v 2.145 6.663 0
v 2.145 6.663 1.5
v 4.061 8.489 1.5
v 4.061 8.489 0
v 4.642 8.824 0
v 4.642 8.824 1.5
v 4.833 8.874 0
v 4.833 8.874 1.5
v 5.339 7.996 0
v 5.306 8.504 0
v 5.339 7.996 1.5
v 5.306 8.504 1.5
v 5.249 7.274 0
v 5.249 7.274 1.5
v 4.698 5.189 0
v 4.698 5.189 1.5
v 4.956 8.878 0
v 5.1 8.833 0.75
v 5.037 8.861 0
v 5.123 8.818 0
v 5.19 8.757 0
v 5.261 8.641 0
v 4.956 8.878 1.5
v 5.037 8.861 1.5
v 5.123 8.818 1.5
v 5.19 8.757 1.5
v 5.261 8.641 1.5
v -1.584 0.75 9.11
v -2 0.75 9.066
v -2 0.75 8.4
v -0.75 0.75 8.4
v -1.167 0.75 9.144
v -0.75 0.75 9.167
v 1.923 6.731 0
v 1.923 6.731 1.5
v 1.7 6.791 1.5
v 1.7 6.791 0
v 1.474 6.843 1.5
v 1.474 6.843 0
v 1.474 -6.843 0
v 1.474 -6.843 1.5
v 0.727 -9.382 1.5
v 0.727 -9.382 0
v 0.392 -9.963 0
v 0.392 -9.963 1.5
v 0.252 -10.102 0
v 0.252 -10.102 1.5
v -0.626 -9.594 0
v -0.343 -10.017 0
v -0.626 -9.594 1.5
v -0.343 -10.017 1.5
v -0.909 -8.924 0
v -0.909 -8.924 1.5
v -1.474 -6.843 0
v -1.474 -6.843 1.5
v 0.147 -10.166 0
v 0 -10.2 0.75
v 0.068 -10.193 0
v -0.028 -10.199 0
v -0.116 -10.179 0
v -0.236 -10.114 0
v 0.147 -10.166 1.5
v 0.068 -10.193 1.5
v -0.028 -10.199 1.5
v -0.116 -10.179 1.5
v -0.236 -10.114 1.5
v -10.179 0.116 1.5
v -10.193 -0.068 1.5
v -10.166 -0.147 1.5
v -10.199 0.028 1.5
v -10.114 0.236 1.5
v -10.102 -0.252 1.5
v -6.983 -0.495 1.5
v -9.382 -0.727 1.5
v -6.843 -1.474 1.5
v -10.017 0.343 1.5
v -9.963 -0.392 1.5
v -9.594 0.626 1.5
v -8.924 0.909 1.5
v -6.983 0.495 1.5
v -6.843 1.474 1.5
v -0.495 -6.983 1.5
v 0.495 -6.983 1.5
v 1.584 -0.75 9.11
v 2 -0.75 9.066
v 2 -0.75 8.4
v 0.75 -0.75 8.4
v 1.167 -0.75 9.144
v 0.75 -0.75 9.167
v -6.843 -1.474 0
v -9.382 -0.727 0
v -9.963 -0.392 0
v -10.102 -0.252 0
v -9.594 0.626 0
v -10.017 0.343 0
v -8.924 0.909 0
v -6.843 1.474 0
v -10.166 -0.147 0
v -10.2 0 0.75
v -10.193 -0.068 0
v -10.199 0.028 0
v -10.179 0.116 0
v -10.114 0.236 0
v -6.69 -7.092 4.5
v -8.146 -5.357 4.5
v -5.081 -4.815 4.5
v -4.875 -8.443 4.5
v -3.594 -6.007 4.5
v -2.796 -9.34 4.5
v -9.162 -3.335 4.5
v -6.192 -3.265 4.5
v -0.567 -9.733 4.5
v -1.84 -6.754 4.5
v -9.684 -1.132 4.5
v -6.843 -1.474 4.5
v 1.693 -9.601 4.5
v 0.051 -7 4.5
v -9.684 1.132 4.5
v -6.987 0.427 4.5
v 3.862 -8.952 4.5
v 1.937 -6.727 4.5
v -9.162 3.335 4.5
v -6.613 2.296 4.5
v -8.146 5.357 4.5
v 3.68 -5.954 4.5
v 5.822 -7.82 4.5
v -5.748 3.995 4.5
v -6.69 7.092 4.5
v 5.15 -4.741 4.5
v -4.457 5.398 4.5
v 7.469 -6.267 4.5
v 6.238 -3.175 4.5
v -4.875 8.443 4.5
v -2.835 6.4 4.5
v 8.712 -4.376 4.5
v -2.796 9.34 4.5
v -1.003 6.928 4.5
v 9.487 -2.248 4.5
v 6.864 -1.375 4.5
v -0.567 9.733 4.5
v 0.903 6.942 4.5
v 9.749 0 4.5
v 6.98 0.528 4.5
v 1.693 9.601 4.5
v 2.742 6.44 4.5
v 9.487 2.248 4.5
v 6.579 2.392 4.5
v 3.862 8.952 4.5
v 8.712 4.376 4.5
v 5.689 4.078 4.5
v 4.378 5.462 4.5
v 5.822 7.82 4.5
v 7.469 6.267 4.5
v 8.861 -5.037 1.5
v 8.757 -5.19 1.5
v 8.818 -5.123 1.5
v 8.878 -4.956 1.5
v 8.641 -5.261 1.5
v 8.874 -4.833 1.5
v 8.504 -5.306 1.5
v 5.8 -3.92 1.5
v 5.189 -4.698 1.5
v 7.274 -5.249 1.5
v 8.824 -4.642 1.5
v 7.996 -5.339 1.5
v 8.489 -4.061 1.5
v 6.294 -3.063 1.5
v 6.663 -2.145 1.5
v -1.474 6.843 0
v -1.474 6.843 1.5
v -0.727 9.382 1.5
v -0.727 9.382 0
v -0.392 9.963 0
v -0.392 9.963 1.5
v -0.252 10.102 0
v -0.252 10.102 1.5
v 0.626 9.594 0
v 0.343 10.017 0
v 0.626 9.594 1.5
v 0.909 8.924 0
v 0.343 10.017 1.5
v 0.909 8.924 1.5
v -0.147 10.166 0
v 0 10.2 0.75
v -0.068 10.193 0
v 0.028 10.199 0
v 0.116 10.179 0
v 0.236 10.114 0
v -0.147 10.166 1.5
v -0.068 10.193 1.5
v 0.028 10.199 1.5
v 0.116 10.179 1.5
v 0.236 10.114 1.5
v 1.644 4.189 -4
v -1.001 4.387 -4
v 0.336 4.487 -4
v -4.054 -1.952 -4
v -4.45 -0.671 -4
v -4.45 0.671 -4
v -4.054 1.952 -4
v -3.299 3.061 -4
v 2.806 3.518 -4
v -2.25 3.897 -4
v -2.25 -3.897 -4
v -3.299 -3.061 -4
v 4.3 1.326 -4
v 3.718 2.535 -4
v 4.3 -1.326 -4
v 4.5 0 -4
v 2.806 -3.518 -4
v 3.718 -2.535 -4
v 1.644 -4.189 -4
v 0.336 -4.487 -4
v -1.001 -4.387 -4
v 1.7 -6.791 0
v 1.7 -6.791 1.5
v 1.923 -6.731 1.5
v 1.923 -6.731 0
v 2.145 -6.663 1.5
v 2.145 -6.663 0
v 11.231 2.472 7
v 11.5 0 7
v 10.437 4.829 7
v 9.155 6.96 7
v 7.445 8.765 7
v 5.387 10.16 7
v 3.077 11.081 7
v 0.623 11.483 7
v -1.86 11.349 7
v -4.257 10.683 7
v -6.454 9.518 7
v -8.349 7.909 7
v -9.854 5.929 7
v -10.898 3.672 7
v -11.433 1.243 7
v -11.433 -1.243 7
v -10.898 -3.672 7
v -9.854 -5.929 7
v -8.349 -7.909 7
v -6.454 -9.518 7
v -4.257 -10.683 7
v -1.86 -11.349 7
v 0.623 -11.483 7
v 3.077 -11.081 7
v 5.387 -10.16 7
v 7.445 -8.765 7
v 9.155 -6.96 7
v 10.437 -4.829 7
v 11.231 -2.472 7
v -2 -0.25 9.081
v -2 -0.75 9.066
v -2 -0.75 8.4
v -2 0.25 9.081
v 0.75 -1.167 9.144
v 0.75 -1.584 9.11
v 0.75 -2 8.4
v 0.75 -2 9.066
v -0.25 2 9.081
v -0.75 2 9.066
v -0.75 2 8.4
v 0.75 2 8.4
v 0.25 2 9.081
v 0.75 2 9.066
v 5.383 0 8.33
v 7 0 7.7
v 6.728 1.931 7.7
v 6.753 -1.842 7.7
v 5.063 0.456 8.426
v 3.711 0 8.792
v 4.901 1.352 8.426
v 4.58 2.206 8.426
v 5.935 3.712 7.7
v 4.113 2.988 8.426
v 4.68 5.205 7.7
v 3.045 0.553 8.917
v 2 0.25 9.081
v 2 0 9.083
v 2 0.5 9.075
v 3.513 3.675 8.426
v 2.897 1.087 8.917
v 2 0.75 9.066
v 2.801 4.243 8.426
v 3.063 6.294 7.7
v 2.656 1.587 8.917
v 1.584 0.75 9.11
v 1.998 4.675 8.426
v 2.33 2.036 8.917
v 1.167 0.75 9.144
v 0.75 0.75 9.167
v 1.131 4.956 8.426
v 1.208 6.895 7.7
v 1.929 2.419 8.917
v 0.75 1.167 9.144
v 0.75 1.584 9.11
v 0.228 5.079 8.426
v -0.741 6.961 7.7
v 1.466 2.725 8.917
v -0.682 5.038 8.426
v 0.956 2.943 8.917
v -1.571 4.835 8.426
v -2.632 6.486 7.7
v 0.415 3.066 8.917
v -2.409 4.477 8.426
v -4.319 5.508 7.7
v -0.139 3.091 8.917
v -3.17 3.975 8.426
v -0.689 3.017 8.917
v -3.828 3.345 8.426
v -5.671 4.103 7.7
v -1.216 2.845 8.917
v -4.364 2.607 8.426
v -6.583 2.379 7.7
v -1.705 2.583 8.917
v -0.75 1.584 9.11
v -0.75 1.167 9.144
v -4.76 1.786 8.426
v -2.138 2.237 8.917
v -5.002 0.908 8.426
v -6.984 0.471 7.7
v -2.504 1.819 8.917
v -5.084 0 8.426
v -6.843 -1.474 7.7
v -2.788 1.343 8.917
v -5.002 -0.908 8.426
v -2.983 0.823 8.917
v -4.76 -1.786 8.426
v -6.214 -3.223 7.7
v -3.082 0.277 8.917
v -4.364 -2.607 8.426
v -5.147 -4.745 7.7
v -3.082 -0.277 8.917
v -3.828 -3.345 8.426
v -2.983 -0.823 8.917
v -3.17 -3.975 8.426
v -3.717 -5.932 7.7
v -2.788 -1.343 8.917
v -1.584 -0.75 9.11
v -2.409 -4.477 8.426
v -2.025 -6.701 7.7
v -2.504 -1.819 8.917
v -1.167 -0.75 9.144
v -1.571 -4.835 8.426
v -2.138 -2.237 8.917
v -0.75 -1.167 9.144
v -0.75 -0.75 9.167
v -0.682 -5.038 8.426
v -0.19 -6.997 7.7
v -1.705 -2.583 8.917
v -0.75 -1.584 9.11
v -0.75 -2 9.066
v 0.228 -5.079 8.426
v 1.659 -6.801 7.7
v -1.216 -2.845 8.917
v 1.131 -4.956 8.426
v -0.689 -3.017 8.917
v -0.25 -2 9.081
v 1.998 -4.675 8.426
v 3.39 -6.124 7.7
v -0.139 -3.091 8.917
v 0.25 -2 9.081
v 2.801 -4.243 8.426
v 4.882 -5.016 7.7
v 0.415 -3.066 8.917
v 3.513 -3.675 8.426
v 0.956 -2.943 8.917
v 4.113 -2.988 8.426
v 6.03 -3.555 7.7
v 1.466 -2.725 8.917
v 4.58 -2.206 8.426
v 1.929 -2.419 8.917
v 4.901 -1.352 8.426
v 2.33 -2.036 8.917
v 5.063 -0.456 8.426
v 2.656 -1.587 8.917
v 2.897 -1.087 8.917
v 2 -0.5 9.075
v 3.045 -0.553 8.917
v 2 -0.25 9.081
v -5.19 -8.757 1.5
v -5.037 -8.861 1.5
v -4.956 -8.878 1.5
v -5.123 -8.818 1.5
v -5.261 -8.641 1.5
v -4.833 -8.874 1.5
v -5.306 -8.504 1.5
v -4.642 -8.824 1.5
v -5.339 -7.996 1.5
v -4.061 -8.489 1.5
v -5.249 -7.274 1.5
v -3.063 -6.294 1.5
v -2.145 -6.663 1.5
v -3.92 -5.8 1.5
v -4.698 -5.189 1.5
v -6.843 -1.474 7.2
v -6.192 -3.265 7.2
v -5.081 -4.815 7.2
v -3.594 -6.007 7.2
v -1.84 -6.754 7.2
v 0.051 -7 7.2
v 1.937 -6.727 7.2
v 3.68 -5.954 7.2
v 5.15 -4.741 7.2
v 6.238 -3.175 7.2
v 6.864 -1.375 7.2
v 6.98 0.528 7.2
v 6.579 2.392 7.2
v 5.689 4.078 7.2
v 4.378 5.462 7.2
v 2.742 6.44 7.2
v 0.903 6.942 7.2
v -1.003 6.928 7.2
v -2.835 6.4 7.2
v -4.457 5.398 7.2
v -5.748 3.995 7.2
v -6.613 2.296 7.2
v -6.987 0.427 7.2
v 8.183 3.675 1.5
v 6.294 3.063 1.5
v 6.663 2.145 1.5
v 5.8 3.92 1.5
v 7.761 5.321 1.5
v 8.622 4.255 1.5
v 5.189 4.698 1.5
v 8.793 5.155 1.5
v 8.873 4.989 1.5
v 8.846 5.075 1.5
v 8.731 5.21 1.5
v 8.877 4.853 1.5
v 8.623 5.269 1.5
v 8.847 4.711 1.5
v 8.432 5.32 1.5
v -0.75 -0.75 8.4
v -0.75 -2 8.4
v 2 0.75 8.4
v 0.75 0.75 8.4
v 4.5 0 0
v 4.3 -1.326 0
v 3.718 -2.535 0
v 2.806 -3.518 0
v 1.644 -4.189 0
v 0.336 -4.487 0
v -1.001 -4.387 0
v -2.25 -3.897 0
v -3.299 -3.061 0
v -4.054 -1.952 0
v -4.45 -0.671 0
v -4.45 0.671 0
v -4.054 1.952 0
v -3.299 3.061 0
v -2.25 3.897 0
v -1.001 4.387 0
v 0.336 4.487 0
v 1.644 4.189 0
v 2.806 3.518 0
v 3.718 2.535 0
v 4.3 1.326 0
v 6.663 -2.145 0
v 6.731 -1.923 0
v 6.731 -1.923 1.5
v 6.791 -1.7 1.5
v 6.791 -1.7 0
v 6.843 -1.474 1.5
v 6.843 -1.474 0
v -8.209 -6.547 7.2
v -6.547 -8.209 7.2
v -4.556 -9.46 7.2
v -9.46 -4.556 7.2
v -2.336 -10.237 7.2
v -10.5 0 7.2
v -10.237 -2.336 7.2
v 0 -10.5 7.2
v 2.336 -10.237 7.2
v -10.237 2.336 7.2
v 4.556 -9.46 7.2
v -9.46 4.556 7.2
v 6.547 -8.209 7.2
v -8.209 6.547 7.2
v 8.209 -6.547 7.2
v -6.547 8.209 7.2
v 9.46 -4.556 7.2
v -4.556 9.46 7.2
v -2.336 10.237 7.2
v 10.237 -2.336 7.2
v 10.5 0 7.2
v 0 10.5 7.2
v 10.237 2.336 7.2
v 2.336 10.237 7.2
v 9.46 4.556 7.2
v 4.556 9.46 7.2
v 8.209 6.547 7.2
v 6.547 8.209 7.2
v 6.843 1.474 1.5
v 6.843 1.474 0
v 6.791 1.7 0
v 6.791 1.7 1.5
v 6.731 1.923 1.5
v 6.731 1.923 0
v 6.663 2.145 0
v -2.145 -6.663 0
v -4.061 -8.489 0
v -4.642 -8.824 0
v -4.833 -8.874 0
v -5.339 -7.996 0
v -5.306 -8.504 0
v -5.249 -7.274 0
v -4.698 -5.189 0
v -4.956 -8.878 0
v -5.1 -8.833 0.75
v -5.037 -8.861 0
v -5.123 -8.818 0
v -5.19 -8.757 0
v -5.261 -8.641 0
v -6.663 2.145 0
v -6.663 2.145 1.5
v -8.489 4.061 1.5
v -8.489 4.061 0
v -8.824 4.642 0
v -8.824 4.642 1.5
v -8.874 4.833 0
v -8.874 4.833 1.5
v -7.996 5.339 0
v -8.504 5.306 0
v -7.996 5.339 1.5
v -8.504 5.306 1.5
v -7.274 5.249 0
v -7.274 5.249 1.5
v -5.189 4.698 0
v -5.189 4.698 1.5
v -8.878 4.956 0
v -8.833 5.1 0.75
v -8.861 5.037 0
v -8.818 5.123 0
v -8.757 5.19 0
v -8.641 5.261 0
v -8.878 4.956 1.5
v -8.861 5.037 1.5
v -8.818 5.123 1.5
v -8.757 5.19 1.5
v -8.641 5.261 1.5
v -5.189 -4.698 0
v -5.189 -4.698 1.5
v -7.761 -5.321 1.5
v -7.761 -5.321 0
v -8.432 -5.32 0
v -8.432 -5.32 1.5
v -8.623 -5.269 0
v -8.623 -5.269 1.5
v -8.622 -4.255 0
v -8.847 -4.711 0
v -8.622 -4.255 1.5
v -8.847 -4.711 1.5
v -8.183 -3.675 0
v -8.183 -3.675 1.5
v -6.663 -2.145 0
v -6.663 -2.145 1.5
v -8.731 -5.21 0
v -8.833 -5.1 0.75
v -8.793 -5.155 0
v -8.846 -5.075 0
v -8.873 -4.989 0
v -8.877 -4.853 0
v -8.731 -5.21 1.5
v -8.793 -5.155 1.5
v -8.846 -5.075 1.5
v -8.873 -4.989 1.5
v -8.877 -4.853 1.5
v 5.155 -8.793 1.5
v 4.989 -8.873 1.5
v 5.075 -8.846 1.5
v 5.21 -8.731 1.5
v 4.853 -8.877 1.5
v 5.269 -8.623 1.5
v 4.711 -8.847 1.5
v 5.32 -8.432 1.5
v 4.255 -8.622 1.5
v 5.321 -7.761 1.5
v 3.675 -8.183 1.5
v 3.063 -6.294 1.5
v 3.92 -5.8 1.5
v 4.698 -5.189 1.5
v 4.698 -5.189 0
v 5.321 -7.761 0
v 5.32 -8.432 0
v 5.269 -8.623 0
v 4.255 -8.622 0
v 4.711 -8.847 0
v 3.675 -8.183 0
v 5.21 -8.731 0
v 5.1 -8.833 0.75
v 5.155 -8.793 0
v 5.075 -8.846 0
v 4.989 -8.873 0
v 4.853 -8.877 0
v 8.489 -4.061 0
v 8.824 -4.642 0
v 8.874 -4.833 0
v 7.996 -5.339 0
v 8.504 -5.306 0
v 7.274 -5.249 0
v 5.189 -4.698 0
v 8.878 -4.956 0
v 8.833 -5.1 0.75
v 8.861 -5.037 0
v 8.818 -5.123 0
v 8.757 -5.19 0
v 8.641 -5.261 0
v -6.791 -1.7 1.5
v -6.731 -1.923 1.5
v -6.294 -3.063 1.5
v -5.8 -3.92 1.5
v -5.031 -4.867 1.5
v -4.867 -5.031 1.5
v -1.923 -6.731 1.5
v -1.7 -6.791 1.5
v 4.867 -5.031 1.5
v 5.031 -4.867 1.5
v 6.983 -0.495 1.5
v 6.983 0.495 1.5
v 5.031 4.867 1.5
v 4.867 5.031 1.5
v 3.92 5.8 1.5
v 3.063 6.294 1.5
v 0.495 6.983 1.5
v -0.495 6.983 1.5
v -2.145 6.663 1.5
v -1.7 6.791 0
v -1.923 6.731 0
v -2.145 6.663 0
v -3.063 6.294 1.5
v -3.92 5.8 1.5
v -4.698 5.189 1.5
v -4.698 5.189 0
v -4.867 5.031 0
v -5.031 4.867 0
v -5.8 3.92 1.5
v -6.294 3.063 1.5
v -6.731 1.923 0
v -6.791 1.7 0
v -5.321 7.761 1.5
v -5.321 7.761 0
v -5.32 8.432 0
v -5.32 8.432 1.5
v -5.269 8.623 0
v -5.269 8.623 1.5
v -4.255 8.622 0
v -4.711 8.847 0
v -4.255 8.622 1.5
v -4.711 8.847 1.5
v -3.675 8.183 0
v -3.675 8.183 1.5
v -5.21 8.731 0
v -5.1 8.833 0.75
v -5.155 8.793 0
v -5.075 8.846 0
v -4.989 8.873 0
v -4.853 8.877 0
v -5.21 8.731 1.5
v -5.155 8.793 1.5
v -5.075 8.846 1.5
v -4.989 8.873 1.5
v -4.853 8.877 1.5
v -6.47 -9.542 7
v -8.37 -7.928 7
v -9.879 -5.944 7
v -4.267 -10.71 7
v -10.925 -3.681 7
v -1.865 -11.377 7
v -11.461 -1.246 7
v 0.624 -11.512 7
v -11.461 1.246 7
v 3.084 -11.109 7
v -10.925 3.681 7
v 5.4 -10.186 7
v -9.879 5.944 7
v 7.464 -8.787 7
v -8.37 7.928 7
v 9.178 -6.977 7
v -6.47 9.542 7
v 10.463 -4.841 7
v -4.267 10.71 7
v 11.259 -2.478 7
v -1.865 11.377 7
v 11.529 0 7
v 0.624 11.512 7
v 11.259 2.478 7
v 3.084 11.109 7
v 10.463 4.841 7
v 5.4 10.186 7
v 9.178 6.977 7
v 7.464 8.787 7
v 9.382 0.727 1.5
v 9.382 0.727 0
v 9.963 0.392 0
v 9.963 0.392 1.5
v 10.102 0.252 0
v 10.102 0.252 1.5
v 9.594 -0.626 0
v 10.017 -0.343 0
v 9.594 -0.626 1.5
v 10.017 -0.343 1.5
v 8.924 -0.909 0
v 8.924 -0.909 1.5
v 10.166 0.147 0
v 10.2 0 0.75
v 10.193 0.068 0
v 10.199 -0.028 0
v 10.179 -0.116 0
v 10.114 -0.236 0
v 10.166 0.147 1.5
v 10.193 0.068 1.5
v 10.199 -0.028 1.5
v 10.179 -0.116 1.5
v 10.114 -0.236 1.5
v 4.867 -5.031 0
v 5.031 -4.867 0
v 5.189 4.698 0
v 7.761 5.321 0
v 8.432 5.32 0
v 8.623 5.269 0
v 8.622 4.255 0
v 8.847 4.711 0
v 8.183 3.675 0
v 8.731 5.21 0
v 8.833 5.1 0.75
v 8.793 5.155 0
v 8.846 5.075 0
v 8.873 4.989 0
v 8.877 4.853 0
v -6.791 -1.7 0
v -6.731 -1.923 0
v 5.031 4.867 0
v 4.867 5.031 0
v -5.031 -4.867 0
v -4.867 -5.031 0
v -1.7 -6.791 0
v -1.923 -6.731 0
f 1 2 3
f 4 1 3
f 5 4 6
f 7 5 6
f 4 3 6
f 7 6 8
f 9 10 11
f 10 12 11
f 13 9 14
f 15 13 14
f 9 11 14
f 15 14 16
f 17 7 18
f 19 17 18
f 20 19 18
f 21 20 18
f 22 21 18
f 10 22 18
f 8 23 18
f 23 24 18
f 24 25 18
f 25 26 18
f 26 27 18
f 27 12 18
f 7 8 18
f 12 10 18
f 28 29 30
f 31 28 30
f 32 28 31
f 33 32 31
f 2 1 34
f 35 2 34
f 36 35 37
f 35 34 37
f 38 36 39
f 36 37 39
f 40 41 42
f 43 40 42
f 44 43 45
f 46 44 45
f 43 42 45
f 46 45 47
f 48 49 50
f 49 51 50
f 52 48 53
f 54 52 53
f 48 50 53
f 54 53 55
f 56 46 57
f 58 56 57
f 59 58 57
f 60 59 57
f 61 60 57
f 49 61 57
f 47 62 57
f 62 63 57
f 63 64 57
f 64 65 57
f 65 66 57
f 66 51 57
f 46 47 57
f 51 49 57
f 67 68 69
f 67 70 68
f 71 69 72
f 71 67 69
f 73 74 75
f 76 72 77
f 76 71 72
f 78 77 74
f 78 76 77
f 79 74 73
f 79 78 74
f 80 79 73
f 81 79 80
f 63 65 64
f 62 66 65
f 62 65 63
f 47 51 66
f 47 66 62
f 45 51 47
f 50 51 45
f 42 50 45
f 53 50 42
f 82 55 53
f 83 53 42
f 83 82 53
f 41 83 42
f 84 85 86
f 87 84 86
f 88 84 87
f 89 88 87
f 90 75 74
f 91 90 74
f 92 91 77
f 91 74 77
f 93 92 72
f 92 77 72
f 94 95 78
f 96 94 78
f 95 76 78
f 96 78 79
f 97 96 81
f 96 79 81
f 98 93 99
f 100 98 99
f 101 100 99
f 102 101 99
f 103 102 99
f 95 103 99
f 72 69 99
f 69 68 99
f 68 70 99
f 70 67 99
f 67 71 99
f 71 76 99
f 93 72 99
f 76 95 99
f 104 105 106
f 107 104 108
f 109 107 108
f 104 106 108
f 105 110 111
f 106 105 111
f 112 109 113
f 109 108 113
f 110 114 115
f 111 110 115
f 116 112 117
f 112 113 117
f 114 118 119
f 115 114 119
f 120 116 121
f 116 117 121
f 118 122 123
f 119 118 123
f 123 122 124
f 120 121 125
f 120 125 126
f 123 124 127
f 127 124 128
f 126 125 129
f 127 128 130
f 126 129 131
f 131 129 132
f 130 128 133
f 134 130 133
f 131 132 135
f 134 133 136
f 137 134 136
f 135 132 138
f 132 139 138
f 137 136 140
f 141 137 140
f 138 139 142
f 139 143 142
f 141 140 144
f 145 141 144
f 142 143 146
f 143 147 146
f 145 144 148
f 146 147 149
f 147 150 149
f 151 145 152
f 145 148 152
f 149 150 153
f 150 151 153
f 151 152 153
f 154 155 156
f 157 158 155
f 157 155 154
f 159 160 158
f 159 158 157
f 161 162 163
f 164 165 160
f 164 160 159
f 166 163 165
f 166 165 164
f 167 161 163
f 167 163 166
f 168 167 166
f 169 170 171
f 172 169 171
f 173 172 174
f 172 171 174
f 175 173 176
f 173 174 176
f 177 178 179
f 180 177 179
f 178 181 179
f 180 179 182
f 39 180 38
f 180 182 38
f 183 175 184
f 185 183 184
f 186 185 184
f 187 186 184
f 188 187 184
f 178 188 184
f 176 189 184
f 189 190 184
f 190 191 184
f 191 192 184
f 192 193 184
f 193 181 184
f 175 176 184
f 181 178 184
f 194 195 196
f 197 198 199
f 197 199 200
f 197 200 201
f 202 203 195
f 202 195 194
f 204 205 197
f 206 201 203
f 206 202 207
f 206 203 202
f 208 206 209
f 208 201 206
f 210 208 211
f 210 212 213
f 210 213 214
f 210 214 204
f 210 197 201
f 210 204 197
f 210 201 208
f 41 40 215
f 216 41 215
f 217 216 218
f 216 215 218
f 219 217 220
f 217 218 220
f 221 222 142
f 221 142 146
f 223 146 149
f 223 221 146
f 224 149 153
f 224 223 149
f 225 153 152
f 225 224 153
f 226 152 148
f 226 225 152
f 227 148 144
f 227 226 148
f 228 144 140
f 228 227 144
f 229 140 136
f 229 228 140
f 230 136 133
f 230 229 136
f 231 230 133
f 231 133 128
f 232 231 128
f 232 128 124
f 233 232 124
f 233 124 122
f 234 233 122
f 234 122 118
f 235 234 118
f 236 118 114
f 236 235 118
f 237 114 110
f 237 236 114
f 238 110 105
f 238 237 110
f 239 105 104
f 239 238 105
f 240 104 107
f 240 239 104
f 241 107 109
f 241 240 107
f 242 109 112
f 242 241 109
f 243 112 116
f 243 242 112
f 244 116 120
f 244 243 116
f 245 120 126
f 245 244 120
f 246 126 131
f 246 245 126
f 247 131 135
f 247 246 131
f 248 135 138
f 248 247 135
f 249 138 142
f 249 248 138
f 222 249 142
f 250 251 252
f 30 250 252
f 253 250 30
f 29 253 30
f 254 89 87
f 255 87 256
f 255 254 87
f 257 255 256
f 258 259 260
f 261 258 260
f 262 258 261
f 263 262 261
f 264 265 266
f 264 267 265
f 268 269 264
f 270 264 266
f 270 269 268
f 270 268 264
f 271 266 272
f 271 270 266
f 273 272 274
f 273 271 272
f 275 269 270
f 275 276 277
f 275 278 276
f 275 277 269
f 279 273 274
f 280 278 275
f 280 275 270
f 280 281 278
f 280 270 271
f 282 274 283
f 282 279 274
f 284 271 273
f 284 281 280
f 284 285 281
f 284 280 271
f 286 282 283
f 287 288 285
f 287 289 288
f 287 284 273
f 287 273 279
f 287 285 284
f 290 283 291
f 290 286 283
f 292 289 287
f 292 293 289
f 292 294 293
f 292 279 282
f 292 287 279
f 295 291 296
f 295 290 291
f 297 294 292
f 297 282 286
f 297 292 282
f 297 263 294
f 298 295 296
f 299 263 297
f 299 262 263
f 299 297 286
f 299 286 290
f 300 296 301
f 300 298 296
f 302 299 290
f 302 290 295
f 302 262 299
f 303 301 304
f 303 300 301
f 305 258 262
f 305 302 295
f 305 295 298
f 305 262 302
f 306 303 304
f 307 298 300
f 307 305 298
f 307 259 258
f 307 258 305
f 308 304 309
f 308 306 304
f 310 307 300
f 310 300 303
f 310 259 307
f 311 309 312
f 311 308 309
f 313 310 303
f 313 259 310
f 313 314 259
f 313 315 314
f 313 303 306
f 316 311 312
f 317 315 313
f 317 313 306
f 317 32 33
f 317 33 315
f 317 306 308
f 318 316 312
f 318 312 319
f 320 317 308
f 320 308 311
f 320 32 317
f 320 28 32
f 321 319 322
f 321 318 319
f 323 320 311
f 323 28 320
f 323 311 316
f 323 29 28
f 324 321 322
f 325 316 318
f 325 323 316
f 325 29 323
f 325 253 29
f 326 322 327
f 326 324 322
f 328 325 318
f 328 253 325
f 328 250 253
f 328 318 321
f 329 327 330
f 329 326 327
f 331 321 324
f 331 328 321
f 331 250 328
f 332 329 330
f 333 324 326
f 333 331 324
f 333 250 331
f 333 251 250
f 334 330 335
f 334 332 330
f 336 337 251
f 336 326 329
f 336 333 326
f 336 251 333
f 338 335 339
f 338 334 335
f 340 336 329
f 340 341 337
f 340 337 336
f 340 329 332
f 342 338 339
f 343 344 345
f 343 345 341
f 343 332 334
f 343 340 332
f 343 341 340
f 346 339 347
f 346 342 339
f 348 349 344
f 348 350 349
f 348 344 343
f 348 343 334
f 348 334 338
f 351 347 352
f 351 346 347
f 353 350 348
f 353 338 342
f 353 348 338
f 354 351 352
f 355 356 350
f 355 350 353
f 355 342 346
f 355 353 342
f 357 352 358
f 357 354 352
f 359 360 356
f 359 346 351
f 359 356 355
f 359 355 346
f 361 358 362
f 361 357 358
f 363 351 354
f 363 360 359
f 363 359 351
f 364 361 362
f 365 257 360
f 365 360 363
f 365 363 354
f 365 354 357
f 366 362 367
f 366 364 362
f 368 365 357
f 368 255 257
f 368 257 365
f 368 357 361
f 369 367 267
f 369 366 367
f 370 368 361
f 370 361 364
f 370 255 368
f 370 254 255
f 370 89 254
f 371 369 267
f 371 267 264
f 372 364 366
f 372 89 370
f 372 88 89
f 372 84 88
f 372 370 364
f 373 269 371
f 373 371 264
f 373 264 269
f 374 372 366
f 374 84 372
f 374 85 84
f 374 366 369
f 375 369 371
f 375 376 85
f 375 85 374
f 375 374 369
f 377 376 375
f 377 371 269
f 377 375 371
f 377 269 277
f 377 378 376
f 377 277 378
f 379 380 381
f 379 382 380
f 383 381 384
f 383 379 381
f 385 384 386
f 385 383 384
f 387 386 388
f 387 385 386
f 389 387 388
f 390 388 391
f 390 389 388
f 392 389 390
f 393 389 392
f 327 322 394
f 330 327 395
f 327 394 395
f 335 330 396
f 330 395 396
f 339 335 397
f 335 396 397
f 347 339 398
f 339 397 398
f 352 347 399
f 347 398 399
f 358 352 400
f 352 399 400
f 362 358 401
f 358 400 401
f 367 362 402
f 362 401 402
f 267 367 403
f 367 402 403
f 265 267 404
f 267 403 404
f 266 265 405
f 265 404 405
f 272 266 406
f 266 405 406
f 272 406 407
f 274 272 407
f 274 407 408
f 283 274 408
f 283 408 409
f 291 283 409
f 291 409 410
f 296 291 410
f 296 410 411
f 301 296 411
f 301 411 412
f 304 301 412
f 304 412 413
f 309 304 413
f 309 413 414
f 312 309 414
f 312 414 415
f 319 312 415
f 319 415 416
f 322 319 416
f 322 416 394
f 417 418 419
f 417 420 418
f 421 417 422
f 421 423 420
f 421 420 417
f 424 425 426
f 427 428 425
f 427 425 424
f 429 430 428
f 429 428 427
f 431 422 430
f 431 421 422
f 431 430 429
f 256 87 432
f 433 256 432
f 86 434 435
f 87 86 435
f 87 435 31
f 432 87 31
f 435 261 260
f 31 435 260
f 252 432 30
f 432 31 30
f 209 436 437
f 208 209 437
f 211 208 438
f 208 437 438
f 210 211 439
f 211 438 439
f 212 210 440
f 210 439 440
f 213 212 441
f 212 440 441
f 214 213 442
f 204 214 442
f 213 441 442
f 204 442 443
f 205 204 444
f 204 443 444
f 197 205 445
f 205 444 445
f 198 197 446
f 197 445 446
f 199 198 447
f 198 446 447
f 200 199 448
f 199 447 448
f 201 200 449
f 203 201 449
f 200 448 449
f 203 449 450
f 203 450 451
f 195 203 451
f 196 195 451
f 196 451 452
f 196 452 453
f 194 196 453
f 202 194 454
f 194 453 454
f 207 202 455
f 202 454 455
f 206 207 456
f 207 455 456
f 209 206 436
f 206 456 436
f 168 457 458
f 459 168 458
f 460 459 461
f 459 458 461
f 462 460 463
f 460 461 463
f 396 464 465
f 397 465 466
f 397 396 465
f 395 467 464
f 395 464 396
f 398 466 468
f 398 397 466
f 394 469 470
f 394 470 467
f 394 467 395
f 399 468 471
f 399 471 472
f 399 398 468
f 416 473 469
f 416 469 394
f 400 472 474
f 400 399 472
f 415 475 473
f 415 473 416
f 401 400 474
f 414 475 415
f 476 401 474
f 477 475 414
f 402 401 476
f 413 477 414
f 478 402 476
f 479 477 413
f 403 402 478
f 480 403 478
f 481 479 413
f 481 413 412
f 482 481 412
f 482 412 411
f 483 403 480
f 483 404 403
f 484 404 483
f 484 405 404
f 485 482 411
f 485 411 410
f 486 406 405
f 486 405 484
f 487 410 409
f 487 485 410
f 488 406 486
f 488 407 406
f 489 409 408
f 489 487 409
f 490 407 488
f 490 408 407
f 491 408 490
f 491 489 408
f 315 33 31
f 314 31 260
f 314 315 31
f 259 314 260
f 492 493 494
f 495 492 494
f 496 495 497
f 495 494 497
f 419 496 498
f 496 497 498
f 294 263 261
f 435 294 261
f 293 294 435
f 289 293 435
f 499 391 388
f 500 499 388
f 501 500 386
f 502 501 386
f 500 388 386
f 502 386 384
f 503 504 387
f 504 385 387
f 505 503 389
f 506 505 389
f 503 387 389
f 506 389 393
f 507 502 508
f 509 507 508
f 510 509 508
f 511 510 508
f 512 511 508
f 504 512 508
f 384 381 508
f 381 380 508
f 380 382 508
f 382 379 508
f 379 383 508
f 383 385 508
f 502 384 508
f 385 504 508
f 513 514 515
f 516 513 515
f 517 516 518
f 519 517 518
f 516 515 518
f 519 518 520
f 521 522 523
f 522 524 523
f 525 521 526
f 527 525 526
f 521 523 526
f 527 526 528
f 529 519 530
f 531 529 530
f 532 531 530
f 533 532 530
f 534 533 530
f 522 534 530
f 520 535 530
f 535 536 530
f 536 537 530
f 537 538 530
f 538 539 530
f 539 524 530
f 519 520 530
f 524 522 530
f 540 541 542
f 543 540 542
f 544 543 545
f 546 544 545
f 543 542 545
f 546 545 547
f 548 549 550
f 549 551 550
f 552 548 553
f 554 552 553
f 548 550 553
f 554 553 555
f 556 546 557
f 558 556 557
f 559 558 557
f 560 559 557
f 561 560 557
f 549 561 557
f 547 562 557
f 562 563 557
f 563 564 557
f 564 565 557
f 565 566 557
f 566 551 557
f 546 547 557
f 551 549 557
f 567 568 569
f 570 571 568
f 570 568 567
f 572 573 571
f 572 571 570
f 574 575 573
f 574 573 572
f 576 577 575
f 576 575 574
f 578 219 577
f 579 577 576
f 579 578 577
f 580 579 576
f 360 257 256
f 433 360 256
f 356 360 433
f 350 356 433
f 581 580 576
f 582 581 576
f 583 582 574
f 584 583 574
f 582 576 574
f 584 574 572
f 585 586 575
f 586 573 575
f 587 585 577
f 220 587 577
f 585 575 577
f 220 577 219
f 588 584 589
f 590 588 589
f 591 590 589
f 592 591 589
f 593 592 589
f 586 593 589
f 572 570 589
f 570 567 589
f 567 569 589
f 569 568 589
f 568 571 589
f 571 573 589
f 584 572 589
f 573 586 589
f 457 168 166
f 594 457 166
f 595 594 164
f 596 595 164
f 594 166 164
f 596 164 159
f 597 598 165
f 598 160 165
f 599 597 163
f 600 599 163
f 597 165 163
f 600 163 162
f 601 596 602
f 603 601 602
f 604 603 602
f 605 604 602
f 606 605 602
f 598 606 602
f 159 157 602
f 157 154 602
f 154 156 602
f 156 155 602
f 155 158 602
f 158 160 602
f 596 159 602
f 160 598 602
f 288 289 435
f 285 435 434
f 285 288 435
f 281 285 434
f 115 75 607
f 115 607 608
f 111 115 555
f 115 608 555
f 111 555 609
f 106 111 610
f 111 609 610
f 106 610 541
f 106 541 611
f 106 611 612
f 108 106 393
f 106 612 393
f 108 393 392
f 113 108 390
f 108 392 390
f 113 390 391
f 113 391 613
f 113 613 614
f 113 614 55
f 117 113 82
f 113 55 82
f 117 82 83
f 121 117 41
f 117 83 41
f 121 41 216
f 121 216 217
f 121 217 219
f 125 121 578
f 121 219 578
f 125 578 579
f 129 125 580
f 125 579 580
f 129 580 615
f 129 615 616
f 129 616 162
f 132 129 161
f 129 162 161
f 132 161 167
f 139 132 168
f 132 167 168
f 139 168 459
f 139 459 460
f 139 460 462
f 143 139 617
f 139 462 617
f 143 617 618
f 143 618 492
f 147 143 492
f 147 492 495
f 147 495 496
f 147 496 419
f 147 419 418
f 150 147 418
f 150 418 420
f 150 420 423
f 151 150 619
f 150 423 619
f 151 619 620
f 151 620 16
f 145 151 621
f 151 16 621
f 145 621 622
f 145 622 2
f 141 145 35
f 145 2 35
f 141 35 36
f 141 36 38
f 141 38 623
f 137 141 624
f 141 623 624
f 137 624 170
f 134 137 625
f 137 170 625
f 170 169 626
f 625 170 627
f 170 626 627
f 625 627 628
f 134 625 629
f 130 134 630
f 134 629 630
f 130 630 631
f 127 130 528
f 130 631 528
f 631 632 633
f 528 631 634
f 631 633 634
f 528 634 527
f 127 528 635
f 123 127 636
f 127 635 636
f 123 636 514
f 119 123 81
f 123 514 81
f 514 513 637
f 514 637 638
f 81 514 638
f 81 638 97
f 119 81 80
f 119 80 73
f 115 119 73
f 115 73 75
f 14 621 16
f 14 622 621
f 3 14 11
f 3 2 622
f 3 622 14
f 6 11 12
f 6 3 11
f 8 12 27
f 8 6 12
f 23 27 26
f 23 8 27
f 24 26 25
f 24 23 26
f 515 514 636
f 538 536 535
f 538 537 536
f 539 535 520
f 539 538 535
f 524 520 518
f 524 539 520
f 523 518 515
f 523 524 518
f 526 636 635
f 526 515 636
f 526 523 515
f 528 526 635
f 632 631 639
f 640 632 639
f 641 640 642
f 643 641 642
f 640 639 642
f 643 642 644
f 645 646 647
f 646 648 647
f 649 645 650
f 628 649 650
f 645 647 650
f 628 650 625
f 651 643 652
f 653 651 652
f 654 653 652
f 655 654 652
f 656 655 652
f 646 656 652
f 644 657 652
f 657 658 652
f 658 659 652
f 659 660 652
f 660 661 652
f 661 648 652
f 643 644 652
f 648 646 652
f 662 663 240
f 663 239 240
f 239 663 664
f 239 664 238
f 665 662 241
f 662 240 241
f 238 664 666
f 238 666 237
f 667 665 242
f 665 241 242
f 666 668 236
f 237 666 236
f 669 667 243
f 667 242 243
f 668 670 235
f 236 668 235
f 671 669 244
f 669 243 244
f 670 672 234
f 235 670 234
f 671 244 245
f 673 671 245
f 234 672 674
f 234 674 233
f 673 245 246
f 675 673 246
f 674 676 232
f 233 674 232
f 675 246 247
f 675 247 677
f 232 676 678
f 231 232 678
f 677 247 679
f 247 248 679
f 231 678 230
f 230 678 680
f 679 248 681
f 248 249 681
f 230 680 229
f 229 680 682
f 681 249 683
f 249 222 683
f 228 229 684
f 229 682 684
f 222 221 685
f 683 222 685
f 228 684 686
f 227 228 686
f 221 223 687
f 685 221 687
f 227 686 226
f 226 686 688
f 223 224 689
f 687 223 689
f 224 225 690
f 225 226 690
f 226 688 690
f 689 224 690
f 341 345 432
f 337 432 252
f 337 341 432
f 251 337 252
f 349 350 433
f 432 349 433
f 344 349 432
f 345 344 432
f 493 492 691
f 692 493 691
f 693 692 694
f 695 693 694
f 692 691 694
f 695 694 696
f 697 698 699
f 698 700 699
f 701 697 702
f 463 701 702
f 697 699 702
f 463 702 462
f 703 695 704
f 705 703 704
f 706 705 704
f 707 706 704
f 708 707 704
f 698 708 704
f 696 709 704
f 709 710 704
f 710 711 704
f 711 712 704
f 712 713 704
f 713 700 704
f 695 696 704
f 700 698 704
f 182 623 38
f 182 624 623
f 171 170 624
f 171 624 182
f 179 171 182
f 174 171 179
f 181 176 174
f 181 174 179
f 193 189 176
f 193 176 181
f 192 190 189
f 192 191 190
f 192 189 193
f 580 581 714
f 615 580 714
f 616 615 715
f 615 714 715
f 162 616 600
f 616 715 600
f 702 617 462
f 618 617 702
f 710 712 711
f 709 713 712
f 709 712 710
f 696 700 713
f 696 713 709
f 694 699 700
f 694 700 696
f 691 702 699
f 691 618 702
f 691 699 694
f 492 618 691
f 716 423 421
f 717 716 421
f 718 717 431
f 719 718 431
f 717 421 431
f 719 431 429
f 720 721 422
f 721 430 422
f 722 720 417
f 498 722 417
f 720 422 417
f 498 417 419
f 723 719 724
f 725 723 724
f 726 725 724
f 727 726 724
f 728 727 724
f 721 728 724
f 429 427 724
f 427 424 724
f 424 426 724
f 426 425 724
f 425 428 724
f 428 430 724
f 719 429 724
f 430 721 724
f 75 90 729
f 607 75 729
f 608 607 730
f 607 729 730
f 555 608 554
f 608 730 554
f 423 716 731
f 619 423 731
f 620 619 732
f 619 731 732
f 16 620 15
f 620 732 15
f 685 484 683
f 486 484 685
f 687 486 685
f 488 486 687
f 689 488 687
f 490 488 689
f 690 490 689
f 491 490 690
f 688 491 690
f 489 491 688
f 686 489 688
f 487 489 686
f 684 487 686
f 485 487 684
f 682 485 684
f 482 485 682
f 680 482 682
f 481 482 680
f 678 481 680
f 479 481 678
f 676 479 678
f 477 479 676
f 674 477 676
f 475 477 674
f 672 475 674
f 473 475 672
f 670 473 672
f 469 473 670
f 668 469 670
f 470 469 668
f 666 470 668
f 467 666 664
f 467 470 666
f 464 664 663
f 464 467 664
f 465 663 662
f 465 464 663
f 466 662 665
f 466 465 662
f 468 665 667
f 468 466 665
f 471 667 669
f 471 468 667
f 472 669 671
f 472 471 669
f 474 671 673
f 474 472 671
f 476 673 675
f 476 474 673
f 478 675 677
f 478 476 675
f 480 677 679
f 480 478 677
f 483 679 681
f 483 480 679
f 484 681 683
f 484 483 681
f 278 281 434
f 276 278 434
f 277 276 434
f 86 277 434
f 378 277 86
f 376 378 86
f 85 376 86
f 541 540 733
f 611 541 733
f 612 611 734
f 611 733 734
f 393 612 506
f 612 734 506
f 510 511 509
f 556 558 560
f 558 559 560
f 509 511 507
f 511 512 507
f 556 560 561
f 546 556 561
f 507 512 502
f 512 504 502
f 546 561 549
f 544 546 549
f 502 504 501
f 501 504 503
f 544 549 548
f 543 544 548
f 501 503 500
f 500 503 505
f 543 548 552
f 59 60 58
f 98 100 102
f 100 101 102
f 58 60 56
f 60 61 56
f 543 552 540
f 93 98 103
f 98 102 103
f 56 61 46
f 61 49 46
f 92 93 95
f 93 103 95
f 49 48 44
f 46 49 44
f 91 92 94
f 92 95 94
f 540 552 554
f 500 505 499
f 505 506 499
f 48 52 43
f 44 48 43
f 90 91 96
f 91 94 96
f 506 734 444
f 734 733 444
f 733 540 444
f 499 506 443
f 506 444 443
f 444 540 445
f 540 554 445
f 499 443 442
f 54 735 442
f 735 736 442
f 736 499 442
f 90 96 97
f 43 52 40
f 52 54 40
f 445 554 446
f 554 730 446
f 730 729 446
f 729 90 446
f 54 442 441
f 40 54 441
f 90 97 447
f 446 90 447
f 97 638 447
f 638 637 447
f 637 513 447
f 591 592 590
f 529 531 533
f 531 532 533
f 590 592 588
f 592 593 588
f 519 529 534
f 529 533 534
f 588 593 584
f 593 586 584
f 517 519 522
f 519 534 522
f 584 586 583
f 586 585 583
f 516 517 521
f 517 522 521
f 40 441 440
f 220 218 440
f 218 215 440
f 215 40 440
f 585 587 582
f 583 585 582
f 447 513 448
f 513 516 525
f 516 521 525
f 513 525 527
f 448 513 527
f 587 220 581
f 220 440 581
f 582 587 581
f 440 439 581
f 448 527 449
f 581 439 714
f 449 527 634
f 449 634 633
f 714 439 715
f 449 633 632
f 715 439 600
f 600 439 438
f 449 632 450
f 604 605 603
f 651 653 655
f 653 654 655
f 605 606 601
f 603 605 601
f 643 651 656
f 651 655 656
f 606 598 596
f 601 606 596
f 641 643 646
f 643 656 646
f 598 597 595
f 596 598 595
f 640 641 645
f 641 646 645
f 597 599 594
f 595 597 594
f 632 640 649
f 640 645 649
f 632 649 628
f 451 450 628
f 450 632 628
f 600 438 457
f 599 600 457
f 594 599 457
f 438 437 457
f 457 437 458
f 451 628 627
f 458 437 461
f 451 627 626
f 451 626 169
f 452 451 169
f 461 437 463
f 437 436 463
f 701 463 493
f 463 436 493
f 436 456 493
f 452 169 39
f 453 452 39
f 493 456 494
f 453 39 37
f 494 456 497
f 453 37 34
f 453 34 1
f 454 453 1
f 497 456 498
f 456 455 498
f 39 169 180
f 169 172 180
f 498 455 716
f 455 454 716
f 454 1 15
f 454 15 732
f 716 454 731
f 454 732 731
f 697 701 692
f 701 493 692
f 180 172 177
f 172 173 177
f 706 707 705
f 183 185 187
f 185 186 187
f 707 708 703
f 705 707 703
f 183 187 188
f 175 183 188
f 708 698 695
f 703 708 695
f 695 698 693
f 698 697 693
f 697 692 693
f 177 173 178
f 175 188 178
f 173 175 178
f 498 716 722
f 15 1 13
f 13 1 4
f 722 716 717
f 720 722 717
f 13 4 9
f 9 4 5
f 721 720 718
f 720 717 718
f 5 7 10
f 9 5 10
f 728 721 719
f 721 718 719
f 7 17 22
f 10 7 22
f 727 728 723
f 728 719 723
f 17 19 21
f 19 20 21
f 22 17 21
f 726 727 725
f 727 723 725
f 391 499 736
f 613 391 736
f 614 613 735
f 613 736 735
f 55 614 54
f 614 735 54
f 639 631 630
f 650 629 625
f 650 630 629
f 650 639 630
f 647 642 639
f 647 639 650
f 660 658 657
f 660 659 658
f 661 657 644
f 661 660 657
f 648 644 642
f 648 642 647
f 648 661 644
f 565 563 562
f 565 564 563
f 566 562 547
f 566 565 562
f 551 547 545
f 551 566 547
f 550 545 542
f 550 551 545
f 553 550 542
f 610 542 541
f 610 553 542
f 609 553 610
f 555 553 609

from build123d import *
from build123d.topology import SkipClean

# Parameters (mm, degrees)
SKETCH1_R             = 7
GEARPLATE_DEPTH       = 1.5
BOSS_EXTRUDE3_DEPTH   = 1.5
CIRPATTERN2_COUNT     = 12
SKETCH3_R             = 4.5
BACKPLATE_DEPTH       = 4
SKETCH4_R             = 7
PLATE_DEPTH           = 3
SKETCH6_R             = 11.5
ANGLEPLATE_DEPTH      = 2.5
ANGLEPLATE_DRAFT      = -35
SKETCH8_R             = 10.5
SMALLANGLEPLATE_DEPTH = 0.2
SMALLANGLEPLATE_DRAFT = 79
SKETCH9_R             = 7
DOMEEXTRUDE_DEPTH     = 0.5
DOME1_FACE_RADIUS     = 7
DOME1_HEIGHT          = 1.5
CUT_EXTRUDE1_DEPTH    = 3.8


with BuildPart() as part:
    # Sketch1 → GearPlate (new body)
    with BuildSketch(Plane.XY):
        Circle(SKETCH1_R)
    extrude(amount=GEARPLATE_DEPTH)

    # Sketch2 → Boss-Extrude3 (add)
    with BuildSketch(Plane.XY.offset(1.5)):
        with BuildLine():
            Line((-1.47374446, 6.843104359), (1.47374446, 6.843104359))
            add(Edge.make_bspline(
                [(-1.47374446, 6.843104359), (0, 13.556322037), (1.47374446, 6.843104359)],
                knots=[0, 0, 0, 1, 1, 1], degree=2))
        make_face()
    boss_extrude3 = extrude(amount=-BOSS_EXTRUDE3_DEPTH)

    # CirPattern2: Boss-Extrude3 ×12 about axis
    cirpattern2_axis = Axis((0, 0, 1.5), (0, 0, -1))
    for i in range(1, CIRPATTERN2_COUNT):
        add(boss_extrude3.rotate(cirpattern2_axis, i * 360 / CIRPATTERN2_COUNT))

    # Sketch3 → BackPlate (add)
    with BuildSketch(Plane(origin=(0, 0, 0), x_dir=(-1, 0, 0), z_dir=(0, 0, -1))):
        with Locations(Location((0, 0, 0), (0, 0, 180))):
            Circle(SKETCH3_R)
    extrude(amount=BACKPLATE_DEPTH)

    # Sketch4 → Plate (add)
    with BuildSketch(Plane.XY.offset(1.5)):
        with Locations(Location((0, 0, 0), (0, 0, 192.153701922))):
            Circle(SKETCH4_R)
    extrude(amount=PLATE_DEPTH)


with BuildPart() as angleplate_tool:
    # Sketch6 → AnglePlate (with draft: the straight prism first)
    with BuildSketch(Plane.XY.offset(7)):
        Circle(SKETCH6_R)
    extrude(amount=-ANGLEPLATE_DEPTH)
    # AnglePlate: the draft: its side faces are tilted about the plane it starts from
    angleplate_sides = [angleplate_tool.faces().sort_by_distance(p)[0] for p in [
        (-11.5, 0, 5.75),
    ]]
    draft(angleplate_sides, Plane.XY.offset(7), ANGLEPLATE_DRAFT)


with BuildPart() as part_1:
    add(part.part)

    # AnglePlate: add angleplate_tool
    add(angleplate_tool.part)


with BuildPart() as smallangleplate_tool:
    # Sketch8 → SmallAnglePlate (with draft: the straight prism first)
    with BuildSketch(Plane.XY.offset(7.2)):
        Circle(SKETCH8_R)
    extrude(amount=-SMALLANGLEPLATE_DEPTH)
    # SmallAnglePlate: the draft: its side faces are tilted about the plane it starts from
    smallangleplate_sides = [smallangleplate_tool.faces().sort_by_distance(p)[0] for p in [
        (-10.5, 0, 7.1),
    ]]
    draft(smallangleplate_sides, Plane.XY.offset(7.2), SMALLANGLEPLATE_DRAFT)


with BuildPart() as part_2:
    add(part_1.part)

    # SmallAnglePlate: add smallangleplate_tool
    add(smallangleplate_tool.part)

    # Sketch9 → DomeExtrude (add)
    with SkipClean():  # the faces are left unmerged after this step: merging them gives an invalid solid
        with BuildSketch(Plane.XY.offset(7.2)):
            with Locations(Location((0, 0, 0), (0, 0, 192.153701922))):
                Circle(SKETCH9_R)
        extrude(amount=DOMEEXTRUDE_DEPTH)

    # Dome1: a dome of height H over a round flat face of radius A is a cap of a sphere of radius (A * A + H * H) / (2 * H)
    dome1_r = (DOME1_FACE_RADIUS * DOME1_FACE_RADIUS + DOME1_HEIGHT * DOME1_HEIGHT) / (2 * DOME1_HEIGHT)
    dome1_base = Plane((0, 0, 7.7), z_dir=(0, 0, 1))
    with Locations(dome1_base.offset(DOME1_HEIGHT - dome1_r)):
        dome1_ball = Sphere(dome1_r, mode=Mode.PRIVATE)
    add(split(dome1_ball, bisect_by=dome1_base, keep=Keep.TOP, mode=Mode.PRIVATE))

    # Sketch11 → Cut-Extrude1 (cut)
    with SkipClean():  # the faces are left unmerged after this step: merging them gives an invalid solid
        with BuildSketch(Plane.XY.offset(12.2)):
            Polygon((-0.75, 2), (0.75, 2), (0.75, 0.75), (2, 0.75), (2, -0.75), (0.75, -0.75), (0.75, -2), (-0.75, -2), (-0.75, -0.75), (-2, -0.75), (-2, 0.75), (-0.75, 0.75), align=None)
        extrude(amount=-CUT_EXTRUDE1_DEPTH, mode=Mode.SUBTRACT)


solid = part_2.part
